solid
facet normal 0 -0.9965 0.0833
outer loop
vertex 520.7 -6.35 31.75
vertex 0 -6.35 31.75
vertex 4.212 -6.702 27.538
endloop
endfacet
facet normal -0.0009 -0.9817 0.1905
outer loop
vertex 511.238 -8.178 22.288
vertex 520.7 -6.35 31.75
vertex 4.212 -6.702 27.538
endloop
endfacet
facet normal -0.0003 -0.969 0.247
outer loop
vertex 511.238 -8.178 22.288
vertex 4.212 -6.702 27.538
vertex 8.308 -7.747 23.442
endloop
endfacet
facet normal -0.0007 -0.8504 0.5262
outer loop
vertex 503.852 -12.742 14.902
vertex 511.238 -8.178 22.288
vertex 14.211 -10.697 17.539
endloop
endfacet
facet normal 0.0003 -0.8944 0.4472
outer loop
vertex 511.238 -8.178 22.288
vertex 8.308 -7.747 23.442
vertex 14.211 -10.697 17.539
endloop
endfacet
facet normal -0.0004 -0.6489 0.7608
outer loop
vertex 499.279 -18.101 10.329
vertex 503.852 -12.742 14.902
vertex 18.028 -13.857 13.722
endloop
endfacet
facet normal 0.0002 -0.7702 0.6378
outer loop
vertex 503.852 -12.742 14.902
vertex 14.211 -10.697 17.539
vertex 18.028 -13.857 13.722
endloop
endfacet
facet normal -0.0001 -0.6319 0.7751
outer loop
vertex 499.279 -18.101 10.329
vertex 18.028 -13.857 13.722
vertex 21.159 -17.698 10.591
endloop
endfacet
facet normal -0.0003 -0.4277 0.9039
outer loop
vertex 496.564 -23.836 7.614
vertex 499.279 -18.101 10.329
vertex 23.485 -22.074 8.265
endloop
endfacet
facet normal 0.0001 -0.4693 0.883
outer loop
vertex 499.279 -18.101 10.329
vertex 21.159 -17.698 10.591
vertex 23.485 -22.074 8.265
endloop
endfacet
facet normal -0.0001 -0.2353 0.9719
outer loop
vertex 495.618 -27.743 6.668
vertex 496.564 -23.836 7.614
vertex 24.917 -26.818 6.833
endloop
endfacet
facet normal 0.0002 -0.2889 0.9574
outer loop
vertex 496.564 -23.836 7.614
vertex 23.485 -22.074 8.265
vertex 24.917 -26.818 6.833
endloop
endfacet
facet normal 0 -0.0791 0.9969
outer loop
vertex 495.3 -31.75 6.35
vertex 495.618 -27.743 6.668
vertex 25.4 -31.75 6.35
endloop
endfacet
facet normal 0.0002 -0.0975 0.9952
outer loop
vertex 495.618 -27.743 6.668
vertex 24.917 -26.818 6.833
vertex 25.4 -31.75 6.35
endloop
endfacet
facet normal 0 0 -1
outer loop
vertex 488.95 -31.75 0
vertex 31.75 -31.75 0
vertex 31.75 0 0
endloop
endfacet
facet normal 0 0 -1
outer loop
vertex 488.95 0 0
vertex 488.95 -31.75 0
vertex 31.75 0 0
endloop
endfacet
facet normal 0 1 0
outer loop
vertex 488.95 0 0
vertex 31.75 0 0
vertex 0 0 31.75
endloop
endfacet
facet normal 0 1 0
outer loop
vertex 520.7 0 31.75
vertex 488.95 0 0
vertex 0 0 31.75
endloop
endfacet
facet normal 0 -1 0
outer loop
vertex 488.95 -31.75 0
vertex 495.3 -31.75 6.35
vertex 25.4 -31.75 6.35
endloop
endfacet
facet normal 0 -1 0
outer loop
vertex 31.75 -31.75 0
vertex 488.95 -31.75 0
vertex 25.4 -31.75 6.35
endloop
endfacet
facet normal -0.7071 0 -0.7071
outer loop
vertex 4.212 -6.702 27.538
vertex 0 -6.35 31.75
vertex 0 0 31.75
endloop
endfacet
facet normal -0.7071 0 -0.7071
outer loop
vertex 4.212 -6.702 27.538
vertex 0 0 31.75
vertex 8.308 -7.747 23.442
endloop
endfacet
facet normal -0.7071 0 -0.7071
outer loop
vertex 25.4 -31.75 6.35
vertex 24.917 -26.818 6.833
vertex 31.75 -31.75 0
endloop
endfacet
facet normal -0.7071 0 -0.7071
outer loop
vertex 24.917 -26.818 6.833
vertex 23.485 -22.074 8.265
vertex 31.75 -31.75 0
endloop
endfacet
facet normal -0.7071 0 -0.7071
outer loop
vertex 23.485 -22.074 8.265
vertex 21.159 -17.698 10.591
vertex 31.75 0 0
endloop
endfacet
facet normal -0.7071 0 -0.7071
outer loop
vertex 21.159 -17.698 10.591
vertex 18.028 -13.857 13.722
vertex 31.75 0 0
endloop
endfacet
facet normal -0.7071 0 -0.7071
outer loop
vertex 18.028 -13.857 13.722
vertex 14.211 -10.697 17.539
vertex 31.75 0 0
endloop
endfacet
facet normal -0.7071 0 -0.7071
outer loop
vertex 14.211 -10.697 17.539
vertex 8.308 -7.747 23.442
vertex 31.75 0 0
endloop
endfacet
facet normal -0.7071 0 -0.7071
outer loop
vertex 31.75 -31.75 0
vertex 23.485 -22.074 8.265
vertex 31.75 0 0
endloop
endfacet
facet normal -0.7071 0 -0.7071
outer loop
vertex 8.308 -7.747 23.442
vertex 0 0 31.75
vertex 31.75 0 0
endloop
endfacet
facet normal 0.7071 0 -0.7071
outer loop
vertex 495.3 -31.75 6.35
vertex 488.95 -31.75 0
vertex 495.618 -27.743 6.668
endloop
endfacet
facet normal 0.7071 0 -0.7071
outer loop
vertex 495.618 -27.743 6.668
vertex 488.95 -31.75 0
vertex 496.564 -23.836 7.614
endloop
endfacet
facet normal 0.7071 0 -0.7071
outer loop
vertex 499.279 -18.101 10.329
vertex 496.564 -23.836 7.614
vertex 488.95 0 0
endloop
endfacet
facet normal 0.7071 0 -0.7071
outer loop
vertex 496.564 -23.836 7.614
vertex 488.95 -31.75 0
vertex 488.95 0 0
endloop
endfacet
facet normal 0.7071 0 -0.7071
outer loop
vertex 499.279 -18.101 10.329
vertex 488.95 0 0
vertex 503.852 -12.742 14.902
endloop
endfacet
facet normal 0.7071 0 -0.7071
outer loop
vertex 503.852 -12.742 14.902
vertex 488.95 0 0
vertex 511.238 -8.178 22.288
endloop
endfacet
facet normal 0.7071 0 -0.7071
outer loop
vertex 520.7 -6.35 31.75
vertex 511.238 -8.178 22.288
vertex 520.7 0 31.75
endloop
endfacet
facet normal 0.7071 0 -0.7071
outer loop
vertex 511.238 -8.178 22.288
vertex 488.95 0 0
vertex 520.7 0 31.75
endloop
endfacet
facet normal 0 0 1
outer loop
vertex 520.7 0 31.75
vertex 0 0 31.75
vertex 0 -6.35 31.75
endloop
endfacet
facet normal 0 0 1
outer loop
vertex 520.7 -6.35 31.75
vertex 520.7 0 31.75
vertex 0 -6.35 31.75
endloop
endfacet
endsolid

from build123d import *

# Parameters (mm, degrees)
F1_DEPTH = 520.7
F3_DEPTH = 50.8


with BuildPart() as f1:
    # F0 (on Right) → F1 (new body)
    with BuildSketch(Plane.YZ):
        with BuildLine():
            Line((-31.75, 0), (0, 0))
            Line((0, 0), (0, 31.75))
            Line((0, 31.75), (-6.35, 31.75))
            ThreePointArc((-6.35, 31.75), (-13.789488, 13.789488), (-31.75, 6.35))
            Line((-31.75, 6.35), (-31.75, 0))
        make_face()
    extrude(amount=F1_DEPTH)

    # F2 (on face) → F3 (cut)
    with BuildSketch(Plane(origin=(0, 0, 0), x_dir=(-1, 0, 0), z_dir=(0, 1, 0))):
        Polygon((0, 0), (0, 31.75), (-31.75, 0), align=None)
        Polygon((-488.95, 0), (-520.7, 31.75), (-520.7, 0), align=None)
    extrude(amount=-F3_DEPTH, mode=Mode.SUBTRACT)


solid = f1.part
